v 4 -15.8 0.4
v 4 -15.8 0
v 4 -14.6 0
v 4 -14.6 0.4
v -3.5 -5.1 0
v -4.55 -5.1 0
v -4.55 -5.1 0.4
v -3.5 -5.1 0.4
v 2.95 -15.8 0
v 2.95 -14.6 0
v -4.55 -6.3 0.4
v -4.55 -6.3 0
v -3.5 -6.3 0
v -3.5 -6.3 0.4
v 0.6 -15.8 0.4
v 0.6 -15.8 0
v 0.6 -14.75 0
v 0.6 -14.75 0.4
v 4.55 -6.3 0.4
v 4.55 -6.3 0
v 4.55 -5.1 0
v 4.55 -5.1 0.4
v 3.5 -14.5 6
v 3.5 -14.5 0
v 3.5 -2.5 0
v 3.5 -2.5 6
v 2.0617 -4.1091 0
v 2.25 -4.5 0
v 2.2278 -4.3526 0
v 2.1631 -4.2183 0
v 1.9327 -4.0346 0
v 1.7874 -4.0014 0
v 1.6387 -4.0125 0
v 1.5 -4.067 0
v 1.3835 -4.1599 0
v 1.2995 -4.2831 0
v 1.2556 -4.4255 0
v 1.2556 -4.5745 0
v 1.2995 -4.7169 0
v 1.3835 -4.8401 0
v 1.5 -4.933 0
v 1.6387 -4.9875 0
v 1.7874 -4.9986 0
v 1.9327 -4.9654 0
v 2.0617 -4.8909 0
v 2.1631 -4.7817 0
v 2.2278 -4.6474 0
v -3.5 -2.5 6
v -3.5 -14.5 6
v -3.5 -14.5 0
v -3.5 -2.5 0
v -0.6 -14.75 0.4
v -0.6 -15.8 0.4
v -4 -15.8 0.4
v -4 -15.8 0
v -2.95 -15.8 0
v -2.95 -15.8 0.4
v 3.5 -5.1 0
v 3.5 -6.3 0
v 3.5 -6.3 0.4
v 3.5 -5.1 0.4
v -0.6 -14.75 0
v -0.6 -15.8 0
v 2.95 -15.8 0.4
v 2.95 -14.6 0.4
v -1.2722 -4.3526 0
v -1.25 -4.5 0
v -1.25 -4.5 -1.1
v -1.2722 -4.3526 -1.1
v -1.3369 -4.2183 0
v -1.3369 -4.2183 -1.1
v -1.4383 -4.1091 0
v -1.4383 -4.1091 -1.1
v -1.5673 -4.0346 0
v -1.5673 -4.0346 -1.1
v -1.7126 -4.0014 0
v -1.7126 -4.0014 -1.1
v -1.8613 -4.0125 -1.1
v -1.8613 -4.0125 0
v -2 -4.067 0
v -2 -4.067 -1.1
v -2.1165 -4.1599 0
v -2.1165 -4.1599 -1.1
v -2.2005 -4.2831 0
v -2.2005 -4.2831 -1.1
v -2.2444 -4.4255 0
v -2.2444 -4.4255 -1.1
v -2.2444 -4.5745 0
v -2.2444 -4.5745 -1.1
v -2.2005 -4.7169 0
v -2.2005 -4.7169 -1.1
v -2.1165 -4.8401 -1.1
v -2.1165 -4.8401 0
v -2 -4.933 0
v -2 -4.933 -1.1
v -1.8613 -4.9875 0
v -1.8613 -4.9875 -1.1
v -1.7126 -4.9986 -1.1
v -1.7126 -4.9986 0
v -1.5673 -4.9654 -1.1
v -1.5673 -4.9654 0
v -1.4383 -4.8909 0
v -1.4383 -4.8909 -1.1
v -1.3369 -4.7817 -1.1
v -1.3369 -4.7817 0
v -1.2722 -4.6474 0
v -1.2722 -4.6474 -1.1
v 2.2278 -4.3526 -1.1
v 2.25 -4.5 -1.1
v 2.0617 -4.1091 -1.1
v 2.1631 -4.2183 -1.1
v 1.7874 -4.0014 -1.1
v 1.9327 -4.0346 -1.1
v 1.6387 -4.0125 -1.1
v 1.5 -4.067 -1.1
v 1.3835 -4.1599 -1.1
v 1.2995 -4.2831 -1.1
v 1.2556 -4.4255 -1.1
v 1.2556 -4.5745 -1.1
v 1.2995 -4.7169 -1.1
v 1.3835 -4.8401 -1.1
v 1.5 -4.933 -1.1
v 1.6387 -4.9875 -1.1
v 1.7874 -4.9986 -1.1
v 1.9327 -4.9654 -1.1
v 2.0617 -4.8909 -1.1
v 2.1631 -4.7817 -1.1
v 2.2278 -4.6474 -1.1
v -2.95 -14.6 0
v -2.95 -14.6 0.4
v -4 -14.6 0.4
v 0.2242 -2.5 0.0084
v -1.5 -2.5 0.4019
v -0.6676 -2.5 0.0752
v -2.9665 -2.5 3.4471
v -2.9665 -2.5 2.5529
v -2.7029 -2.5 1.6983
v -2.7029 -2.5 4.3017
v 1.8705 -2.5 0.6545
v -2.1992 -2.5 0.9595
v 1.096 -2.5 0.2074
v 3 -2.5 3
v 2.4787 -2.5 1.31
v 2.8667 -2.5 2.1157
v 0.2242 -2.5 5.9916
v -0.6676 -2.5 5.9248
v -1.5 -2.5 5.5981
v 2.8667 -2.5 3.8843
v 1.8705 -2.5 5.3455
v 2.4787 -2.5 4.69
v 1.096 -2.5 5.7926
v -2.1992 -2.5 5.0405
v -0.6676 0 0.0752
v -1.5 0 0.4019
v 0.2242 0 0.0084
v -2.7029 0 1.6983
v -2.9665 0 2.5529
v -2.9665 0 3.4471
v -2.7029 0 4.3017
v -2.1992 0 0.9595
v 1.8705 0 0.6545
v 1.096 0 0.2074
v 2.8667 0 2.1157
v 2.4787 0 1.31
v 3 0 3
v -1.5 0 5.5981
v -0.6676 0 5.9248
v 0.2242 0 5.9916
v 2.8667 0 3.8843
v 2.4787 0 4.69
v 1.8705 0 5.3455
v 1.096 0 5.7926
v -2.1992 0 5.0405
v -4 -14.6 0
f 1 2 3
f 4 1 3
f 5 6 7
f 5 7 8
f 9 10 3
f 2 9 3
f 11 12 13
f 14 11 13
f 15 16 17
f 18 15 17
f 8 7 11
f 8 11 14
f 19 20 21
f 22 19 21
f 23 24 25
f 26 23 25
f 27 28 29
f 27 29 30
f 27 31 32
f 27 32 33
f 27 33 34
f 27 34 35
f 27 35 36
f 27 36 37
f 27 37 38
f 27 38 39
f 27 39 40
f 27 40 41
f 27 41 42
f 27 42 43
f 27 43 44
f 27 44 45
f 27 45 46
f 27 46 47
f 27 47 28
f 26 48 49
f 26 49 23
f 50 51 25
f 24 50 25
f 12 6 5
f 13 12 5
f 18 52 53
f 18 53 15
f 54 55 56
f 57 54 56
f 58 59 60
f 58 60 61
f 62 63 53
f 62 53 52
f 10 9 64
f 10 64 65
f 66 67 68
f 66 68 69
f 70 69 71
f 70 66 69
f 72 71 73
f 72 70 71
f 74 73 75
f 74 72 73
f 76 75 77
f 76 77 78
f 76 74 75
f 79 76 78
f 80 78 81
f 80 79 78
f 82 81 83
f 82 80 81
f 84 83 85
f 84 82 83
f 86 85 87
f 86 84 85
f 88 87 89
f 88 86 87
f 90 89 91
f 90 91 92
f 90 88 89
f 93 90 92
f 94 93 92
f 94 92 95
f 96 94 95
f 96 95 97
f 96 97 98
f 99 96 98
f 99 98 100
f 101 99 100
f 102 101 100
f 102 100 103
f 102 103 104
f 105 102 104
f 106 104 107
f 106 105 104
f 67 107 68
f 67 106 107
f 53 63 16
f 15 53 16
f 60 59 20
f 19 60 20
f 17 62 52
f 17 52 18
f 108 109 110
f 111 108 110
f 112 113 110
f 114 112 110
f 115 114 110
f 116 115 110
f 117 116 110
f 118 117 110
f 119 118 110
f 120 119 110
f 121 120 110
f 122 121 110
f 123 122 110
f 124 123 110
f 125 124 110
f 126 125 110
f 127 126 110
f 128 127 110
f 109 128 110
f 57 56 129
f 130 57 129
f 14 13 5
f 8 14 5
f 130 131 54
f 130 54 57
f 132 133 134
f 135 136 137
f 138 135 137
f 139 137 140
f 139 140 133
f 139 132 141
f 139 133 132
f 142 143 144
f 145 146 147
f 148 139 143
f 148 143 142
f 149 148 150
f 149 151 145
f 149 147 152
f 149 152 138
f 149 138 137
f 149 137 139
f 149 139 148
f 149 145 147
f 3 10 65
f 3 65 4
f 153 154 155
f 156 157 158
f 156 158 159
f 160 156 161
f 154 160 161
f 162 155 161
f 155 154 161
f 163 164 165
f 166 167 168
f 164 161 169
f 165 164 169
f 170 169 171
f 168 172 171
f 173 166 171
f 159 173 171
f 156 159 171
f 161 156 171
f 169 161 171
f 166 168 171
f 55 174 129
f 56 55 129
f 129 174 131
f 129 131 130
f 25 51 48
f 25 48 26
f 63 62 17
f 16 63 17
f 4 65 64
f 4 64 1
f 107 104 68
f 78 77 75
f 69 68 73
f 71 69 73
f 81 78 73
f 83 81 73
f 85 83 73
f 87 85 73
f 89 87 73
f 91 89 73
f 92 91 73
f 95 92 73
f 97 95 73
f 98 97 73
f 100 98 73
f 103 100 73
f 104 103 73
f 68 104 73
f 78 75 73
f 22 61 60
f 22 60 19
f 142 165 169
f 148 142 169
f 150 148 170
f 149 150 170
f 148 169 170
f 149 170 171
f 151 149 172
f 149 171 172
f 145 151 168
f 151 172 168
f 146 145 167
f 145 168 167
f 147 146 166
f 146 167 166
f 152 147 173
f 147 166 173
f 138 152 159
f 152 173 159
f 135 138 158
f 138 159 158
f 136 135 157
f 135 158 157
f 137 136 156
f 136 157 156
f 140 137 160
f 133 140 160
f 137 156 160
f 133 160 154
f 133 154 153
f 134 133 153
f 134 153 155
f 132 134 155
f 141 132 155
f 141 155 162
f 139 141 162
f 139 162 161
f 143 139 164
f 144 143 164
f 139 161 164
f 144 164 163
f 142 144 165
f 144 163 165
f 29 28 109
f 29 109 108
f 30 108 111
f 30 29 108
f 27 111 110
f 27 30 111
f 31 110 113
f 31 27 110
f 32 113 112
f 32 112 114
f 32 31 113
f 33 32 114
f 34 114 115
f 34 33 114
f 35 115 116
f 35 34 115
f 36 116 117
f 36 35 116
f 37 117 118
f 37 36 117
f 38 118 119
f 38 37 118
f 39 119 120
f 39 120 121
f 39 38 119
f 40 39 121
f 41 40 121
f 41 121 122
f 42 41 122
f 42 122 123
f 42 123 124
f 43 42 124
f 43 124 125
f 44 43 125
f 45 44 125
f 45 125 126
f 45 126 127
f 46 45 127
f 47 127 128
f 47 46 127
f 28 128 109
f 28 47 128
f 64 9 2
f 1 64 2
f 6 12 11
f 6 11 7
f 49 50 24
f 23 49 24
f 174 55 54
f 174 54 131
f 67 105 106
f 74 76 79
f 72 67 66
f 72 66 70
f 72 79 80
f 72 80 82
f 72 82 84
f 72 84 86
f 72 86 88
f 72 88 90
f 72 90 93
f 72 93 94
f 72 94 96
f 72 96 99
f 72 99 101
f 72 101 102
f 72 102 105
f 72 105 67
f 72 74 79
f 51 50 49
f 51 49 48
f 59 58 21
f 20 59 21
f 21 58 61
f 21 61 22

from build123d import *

# Parameters (mm, degrees)
SKETCH_W      = 7
SKETCH_H      = 12
PAD_DEPTH     = 6
SKETCH001_R   = 3
PAD001_DEPTH  = 2.5
SKETCH002_W   = 1.05
SKETCH002_H   = 1.2
SKETCH002_W_2 = 1.2
SKETCH002_H_2 = 1.05
PAD002_DEPTH  = 0.4
SKETCH003_R   = 0.5
PAD003_DEPTH  = 1.1


with BuildPart() as pad:
    # Sketch → Pad (new body)
    with BuildSketch(Plane.XY):
        with Locations((0, -8.5)):
            Rectangle(SKETCH_W, SKETCH_H)
    extrude(amount=PAD_DEPTH)


with BuildPart() as pad001:
    # Sketch001 → Pad001 (new body)
    with BuildSketch(Plane.XZ):
        with Locations((0, 3)):
            Circle(SKETCH001_R)
    extrude(amount=PAD001_DEPTH)


with BuildPart() as pad002:
    # Sketch002 → Pad002 (new body)
    with BuildSketch(Plane.XY):
        with Locations((-4.025, -5.7)):
            Rectangle(SKETCH002_W, SKETCH002_H)
        with Locations((-3.475, -15.2)):
            Rectangle(SKETCH002_W, SKETCH002_H)
        with Locations((0, -15.275)):
            Rectangle(SKETCH002_W_2, SKETCH002_H_2)
        with Locations((3.475, -15.2)):
            Rectangle(SKETCH002_W, SKETCH002_H)
        with Locations((4.025, -5.7)):
            Rectangle(SKETCH002_W, SKETCH002_H)
    extrude(amount=PAD002_DEPTH)


with BuildPart() as pad003:
    # Sketch003 → Pad003 (new body)
    with BuildSketch(Plane.XY):
        with Locations((-1.75, -4.5)):
            Circle(SKETCH003_R)
        with Locations((1.75, -4.5)):
            Circle(SKETCH003_R)
    extrude(amount=-PAD003_DEPTH)


solid = Compound([pad.part, pad001.part, pad002.part, pad003.part])
